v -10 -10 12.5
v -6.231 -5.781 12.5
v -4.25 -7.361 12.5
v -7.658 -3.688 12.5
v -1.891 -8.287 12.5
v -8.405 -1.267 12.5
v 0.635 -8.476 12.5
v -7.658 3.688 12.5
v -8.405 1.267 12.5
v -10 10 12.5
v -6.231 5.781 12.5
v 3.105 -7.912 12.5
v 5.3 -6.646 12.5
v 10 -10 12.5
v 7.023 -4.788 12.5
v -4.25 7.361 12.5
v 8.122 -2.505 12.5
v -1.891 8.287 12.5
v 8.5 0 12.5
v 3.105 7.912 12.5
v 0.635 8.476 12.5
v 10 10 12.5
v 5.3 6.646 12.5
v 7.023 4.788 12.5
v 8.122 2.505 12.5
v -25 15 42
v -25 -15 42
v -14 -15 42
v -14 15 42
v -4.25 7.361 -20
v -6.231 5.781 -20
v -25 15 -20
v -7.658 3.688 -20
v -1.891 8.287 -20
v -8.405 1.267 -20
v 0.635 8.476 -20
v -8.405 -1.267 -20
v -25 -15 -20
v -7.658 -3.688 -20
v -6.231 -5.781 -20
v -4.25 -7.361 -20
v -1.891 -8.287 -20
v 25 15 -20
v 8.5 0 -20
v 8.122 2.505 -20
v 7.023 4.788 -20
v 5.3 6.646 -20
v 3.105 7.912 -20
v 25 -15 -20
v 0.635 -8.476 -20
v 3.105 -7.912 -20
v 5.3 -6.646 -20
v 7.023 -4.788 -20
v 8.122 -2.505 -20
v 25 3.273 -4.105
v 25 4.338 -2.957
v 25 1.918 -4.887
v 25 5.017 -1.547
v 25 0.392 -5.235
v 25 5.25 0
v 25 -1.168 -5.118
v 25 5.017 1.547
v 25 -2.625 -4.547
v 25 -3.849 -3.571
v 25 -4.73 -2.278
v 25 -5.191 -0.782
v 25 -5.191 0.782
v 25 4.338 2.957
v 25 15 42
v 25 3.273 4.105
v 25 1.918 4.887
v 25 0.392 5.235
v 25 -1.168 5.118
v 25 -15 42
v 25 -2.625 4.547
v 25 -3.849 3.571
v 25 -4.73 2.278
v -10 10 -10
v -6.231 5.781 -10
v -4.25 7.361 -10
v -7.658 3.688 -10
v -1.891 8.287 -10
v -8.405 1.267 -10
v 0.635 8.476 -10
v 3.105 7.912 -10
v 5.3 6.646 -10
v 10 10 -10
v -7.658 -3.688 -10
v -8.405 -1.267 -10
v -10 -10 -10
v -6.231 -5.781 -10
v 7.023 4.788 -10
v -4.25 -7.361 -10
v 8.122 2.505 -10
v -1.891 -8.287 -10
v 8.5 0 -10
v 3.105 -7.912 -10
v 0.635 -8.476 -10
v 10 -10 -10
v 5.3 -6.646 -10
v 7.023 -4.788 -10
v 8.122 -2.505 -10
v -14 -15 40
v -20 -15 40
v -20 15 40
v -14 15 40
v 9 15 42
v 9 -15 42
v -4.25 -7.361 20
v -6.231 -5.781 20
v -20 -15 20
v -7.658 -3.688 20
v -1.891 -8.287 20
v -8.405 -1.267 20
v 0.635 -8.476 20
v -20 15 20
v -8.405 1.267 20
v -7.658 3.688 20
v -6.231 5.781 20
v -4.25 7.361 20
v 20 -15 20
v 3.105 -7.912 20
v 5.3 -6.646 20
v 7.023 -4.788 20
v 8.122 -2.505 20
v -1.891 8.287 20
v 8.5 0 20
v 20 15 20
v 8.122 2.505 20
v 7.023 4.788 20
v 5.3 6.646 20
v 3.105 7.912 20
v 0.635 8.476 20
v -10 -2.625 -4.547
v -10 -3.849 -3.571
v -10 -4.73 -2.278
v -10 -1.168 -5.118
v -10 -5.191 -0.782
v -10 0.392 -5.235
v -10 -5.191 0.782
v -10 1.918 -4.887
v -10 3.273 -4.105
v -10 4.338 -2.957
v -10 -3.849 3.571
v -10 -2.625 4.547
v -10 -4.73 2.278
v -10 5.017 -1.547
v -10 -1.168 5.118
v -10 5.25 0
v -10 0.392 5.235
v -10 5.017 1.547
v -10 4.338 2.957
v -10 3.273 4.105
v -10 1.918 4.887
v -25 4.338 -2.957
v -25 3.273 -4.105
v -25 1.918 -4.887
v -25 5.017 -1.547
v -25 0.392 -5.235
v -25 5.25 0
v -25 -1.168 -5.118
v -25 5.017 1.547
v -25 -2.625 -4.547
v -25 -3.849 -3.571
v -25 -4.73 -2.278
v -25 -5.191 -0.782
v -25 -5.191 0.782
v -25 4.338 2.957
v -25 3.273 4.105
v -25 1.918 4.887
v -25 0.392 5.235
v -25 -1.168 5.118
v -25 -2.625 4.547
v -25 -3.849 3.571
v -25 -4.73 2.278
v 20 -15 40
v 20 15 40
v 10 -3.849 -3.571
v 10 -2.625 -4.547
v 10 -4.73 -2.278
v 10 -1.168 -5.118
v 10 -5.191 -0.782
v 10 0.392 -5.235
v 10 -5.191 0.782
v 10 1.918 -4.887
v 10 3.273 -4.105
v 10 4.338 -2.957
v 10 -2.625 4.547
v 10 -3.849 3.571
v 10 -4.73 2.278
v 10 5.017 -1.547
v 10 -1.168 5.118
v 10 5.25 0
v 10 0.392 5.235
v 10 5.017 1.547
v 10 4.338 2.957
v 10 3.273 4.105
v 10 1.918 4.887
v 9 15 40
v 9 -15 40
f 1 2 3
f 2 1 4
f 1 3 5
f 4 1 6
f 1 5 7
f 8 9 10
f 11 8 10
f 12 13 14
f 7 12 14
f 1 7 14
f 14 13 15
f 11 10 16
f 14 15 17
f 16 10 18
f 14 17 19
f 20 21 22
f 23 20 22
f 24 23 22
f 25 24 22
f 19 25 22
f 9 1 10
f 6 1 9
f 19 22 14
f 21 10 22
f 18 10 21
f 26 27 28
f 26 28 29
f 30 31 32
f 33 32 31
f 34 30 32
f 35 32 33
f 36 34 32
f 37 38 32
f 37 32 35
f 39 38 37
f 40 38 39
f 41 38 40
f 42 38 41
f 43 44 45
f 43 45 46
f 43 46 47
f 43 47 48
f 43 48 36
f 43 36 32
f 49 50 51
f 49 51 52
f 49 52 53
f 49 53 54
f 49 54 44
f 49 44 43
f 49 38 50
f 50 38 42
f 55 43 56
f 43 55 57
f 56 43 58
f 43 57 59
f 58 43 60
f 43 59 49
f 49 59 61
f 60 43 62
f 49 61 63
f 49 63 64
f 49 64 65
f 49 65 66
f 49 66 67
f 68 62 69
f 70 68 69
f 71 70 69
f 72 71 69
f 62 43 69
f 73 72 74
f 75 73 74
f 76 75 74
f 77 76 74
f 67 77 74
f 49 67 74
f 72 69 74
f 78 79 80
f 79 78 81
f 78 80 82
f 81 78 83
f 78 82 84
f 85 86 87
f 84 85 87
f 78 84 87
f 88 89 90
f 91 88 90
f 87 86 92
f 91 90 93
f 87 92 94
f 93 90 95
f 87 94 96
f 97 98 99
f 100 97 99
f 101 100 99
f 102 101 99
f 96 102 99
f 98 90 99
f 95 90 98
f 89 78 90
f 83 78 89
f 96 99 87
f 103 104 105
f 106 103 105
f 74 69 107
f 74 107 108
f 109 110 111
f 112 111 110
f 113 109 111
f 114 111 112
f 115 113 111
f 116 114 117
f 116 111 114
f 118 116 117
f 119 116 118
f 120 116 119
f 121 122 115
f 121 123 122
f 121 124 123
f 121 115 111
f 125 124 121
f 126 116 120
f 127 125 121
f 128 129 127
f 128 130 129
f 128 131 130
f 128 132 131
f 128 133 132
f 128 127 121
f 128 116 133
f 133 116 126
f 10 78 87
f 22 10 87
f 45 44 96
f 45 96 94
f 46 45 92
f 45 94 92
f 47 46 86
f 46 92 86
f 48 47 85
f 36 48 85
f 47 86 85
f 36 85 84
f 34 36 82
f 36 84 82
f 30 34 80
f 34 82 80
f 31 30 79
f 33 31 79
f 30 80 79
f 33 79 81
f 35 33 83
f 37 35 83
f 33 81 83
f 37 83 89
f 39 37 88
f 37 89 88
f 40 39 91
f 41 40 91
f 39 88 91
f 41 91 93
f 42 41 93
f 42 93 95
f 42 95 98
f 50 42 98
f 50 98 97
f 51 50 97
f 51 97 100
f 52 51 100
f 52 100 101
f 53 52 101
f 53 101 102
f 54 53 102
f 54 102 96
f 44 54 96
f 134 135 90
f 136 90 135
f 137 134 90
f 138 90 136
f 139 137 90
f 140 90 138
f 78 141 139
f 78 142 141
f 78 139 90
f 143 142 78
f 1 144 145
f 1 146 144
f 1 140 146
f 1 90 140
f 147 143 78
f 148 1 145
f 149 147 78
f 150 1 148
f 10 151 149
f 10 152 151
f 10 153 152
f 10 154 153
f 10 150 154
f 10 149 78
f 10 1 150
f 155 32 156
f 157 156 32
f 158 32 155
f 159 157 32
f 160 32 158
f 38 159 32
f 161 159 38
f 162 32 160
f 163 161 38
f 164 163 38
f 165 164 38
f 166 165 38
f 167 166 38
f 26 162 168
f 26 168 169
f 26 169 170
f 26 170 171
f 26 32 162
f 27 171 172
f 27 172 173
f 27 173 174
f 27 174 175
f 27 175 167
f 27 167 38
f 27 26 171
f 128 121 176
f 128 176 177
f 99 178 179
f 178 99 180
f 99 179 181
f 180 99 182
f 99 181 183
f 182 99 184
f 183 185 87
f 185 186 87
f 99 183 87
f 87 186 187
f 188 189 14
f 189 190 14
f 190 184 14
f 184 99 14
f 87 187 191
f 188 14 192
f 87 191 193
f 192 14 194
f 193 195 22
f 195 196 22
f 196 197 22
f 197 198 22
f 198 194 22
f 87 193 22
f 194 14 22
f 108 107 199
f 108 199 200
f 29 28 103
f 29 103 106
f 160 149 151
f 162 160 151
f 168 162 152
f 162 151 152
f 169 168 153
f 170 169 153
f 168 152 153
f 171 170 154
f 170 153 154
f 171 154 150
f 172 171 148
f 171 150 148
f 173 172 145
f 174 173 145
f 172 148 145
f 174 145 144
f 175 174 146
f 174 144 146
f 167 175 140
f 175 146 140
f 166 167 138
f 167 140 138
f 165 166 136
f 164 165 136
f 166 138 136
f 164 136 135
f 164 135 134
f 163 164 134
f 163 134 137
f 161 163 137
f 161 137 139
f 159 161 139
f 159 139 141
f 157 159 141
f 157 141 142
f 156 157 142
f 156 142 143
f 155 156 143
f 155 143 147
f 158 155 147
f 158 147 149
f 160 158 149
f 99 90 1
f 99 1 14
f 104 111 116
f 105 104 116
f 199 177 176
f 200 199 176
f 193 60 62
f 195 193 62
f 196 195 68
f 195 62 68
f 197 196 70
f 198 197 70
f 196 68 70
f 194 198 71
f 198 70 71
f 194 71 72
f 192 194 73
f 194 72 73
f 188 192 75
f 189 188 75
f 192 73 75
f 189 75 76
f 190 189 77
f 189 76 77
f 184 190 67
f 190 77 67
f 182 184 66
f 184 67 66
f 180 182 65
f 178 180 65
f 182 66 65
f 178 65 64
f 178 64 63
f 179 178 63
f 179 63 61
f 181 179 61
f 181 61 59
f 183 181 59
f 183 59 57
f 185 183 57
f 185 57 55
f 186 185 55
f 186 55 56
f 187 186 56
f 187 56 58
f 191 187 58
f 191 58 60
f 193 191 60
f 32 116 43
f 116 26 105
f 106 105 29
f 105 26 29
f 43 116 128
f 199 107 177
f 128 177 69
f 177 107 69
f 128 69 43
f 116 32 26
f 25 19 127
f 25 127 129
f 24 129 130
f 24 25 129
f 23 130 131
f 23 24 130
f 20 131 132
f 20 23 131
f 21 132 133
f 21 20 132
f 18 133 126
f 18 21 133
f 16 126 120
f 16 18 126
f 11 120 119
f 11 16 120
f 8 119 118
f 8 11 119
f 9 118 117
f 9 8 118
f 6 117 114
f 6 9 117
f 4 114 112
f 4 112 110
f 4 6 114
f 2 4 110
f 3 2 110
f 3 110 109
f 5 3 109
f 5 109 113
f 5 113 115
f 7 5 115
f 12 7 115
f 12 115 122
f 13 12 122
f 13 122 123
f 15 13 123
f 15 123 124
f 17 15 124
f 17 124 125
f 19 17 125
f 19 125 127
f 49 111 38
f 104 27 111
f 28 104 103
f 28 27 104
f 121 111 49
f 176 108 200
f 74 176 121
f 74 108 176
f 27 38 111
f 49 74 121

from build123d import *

# Parameters (mm, degrees)
F2_W      = 50
F2_H      = 30
F3_DEPTH  = 30
F0_R      = 8.5
F4_DEPTH  = 20
F5_W      = 5
F5_H      = 30
F6_DEPTH  = 22
F7_W      = 30
F7_H      = 2
F8_DEPTH  = 6
F9_W      = 30
F9_H      = 2
F10_DEPTH = 11
F11_W     = 20
F11_H     = 20
F12_DEPTH = 12.5
F13_W     = 50
F13_H     = 30
F14_DEPTH = 10
F15_DEPTH = 25
F16_R     = 5.25
F17_DEPTH = 50


with BuildPart() as f3:
    # F2 (on offset) → F3 (new body)
    with BuildSketch(Plane.XY.offset(20)):
        Rectangle(F2_W, F2_H)
    extrude(amount=-F3_DEPTH)

    # F0 (on Top) → F4 (cut)
    with BuildSketch(Plane.XY):
        Circle(F0_R)
    extrude(amount=F4_DEPTH, mode=Mode.SUBTRACT)

    # F5 (on face) → F6 (join)
    with BuildSketch(Plane.XY.offset(20)):
        with Locations((-22.5, 0)):
            Rectangle(F5_W, F5_H)
        with Locations((22.5, 0)):
            Rectangle(F5_W, F5_H)
    extrude(amount=F6_DEPTH)

    # F7 (on face) → F8 (join)
    with BuildSketch(Plane.YZ.offset(-20)):
        with Locations((0, 41)):
            Rectangle(F7_W, F7_H)
    extrude(amount=F8_DEPTH)

    # F9 (on face) → F10 (join)
    with BuildSketch(Plane(origin=(20, 0, 0), x_dir=(0, -1, 0), z_dir=(-1, 0, 0))):
        with Locations((0, 41)):
            Rectangle(F9_W, F9_H)
    extrude(amount=F10_DEPTH)

    # F11 (on Top) → F12 (cut, symmetric)
    with BuildSketch(Plane.XY):
        Rectangle(F11_W, F11_H)
    extrude(amount=F12_DEPTH, both=True, mode=Mode.SUBTRACT)

    # F13 (on face) → F14 (join)
    with BuildSketch(Plane(origin=(0, 0, -10), x_dir=(1, 0, 0), z_dir=(0, 0, -1))):
        Rectangle(F13_W, F13_H)
    extrude(amount=F14_DEPTH)

    # F0 (on Top) → F15 (cut)
    with BuildSketch(Plane.XY):
        Circle(F0_R)
    extrude(amount=-F15_DEPTH, mode=Mode.SUBTRACT)

    # F16 (on face) → F17 (cut)
    with BuildSketch(Plane.YZ.offset(25)):
        Circle(F16_R)
    extrude(amount=-F17_DEPTH, mode=Mode.SUBTRACT)


solid = f3.part
